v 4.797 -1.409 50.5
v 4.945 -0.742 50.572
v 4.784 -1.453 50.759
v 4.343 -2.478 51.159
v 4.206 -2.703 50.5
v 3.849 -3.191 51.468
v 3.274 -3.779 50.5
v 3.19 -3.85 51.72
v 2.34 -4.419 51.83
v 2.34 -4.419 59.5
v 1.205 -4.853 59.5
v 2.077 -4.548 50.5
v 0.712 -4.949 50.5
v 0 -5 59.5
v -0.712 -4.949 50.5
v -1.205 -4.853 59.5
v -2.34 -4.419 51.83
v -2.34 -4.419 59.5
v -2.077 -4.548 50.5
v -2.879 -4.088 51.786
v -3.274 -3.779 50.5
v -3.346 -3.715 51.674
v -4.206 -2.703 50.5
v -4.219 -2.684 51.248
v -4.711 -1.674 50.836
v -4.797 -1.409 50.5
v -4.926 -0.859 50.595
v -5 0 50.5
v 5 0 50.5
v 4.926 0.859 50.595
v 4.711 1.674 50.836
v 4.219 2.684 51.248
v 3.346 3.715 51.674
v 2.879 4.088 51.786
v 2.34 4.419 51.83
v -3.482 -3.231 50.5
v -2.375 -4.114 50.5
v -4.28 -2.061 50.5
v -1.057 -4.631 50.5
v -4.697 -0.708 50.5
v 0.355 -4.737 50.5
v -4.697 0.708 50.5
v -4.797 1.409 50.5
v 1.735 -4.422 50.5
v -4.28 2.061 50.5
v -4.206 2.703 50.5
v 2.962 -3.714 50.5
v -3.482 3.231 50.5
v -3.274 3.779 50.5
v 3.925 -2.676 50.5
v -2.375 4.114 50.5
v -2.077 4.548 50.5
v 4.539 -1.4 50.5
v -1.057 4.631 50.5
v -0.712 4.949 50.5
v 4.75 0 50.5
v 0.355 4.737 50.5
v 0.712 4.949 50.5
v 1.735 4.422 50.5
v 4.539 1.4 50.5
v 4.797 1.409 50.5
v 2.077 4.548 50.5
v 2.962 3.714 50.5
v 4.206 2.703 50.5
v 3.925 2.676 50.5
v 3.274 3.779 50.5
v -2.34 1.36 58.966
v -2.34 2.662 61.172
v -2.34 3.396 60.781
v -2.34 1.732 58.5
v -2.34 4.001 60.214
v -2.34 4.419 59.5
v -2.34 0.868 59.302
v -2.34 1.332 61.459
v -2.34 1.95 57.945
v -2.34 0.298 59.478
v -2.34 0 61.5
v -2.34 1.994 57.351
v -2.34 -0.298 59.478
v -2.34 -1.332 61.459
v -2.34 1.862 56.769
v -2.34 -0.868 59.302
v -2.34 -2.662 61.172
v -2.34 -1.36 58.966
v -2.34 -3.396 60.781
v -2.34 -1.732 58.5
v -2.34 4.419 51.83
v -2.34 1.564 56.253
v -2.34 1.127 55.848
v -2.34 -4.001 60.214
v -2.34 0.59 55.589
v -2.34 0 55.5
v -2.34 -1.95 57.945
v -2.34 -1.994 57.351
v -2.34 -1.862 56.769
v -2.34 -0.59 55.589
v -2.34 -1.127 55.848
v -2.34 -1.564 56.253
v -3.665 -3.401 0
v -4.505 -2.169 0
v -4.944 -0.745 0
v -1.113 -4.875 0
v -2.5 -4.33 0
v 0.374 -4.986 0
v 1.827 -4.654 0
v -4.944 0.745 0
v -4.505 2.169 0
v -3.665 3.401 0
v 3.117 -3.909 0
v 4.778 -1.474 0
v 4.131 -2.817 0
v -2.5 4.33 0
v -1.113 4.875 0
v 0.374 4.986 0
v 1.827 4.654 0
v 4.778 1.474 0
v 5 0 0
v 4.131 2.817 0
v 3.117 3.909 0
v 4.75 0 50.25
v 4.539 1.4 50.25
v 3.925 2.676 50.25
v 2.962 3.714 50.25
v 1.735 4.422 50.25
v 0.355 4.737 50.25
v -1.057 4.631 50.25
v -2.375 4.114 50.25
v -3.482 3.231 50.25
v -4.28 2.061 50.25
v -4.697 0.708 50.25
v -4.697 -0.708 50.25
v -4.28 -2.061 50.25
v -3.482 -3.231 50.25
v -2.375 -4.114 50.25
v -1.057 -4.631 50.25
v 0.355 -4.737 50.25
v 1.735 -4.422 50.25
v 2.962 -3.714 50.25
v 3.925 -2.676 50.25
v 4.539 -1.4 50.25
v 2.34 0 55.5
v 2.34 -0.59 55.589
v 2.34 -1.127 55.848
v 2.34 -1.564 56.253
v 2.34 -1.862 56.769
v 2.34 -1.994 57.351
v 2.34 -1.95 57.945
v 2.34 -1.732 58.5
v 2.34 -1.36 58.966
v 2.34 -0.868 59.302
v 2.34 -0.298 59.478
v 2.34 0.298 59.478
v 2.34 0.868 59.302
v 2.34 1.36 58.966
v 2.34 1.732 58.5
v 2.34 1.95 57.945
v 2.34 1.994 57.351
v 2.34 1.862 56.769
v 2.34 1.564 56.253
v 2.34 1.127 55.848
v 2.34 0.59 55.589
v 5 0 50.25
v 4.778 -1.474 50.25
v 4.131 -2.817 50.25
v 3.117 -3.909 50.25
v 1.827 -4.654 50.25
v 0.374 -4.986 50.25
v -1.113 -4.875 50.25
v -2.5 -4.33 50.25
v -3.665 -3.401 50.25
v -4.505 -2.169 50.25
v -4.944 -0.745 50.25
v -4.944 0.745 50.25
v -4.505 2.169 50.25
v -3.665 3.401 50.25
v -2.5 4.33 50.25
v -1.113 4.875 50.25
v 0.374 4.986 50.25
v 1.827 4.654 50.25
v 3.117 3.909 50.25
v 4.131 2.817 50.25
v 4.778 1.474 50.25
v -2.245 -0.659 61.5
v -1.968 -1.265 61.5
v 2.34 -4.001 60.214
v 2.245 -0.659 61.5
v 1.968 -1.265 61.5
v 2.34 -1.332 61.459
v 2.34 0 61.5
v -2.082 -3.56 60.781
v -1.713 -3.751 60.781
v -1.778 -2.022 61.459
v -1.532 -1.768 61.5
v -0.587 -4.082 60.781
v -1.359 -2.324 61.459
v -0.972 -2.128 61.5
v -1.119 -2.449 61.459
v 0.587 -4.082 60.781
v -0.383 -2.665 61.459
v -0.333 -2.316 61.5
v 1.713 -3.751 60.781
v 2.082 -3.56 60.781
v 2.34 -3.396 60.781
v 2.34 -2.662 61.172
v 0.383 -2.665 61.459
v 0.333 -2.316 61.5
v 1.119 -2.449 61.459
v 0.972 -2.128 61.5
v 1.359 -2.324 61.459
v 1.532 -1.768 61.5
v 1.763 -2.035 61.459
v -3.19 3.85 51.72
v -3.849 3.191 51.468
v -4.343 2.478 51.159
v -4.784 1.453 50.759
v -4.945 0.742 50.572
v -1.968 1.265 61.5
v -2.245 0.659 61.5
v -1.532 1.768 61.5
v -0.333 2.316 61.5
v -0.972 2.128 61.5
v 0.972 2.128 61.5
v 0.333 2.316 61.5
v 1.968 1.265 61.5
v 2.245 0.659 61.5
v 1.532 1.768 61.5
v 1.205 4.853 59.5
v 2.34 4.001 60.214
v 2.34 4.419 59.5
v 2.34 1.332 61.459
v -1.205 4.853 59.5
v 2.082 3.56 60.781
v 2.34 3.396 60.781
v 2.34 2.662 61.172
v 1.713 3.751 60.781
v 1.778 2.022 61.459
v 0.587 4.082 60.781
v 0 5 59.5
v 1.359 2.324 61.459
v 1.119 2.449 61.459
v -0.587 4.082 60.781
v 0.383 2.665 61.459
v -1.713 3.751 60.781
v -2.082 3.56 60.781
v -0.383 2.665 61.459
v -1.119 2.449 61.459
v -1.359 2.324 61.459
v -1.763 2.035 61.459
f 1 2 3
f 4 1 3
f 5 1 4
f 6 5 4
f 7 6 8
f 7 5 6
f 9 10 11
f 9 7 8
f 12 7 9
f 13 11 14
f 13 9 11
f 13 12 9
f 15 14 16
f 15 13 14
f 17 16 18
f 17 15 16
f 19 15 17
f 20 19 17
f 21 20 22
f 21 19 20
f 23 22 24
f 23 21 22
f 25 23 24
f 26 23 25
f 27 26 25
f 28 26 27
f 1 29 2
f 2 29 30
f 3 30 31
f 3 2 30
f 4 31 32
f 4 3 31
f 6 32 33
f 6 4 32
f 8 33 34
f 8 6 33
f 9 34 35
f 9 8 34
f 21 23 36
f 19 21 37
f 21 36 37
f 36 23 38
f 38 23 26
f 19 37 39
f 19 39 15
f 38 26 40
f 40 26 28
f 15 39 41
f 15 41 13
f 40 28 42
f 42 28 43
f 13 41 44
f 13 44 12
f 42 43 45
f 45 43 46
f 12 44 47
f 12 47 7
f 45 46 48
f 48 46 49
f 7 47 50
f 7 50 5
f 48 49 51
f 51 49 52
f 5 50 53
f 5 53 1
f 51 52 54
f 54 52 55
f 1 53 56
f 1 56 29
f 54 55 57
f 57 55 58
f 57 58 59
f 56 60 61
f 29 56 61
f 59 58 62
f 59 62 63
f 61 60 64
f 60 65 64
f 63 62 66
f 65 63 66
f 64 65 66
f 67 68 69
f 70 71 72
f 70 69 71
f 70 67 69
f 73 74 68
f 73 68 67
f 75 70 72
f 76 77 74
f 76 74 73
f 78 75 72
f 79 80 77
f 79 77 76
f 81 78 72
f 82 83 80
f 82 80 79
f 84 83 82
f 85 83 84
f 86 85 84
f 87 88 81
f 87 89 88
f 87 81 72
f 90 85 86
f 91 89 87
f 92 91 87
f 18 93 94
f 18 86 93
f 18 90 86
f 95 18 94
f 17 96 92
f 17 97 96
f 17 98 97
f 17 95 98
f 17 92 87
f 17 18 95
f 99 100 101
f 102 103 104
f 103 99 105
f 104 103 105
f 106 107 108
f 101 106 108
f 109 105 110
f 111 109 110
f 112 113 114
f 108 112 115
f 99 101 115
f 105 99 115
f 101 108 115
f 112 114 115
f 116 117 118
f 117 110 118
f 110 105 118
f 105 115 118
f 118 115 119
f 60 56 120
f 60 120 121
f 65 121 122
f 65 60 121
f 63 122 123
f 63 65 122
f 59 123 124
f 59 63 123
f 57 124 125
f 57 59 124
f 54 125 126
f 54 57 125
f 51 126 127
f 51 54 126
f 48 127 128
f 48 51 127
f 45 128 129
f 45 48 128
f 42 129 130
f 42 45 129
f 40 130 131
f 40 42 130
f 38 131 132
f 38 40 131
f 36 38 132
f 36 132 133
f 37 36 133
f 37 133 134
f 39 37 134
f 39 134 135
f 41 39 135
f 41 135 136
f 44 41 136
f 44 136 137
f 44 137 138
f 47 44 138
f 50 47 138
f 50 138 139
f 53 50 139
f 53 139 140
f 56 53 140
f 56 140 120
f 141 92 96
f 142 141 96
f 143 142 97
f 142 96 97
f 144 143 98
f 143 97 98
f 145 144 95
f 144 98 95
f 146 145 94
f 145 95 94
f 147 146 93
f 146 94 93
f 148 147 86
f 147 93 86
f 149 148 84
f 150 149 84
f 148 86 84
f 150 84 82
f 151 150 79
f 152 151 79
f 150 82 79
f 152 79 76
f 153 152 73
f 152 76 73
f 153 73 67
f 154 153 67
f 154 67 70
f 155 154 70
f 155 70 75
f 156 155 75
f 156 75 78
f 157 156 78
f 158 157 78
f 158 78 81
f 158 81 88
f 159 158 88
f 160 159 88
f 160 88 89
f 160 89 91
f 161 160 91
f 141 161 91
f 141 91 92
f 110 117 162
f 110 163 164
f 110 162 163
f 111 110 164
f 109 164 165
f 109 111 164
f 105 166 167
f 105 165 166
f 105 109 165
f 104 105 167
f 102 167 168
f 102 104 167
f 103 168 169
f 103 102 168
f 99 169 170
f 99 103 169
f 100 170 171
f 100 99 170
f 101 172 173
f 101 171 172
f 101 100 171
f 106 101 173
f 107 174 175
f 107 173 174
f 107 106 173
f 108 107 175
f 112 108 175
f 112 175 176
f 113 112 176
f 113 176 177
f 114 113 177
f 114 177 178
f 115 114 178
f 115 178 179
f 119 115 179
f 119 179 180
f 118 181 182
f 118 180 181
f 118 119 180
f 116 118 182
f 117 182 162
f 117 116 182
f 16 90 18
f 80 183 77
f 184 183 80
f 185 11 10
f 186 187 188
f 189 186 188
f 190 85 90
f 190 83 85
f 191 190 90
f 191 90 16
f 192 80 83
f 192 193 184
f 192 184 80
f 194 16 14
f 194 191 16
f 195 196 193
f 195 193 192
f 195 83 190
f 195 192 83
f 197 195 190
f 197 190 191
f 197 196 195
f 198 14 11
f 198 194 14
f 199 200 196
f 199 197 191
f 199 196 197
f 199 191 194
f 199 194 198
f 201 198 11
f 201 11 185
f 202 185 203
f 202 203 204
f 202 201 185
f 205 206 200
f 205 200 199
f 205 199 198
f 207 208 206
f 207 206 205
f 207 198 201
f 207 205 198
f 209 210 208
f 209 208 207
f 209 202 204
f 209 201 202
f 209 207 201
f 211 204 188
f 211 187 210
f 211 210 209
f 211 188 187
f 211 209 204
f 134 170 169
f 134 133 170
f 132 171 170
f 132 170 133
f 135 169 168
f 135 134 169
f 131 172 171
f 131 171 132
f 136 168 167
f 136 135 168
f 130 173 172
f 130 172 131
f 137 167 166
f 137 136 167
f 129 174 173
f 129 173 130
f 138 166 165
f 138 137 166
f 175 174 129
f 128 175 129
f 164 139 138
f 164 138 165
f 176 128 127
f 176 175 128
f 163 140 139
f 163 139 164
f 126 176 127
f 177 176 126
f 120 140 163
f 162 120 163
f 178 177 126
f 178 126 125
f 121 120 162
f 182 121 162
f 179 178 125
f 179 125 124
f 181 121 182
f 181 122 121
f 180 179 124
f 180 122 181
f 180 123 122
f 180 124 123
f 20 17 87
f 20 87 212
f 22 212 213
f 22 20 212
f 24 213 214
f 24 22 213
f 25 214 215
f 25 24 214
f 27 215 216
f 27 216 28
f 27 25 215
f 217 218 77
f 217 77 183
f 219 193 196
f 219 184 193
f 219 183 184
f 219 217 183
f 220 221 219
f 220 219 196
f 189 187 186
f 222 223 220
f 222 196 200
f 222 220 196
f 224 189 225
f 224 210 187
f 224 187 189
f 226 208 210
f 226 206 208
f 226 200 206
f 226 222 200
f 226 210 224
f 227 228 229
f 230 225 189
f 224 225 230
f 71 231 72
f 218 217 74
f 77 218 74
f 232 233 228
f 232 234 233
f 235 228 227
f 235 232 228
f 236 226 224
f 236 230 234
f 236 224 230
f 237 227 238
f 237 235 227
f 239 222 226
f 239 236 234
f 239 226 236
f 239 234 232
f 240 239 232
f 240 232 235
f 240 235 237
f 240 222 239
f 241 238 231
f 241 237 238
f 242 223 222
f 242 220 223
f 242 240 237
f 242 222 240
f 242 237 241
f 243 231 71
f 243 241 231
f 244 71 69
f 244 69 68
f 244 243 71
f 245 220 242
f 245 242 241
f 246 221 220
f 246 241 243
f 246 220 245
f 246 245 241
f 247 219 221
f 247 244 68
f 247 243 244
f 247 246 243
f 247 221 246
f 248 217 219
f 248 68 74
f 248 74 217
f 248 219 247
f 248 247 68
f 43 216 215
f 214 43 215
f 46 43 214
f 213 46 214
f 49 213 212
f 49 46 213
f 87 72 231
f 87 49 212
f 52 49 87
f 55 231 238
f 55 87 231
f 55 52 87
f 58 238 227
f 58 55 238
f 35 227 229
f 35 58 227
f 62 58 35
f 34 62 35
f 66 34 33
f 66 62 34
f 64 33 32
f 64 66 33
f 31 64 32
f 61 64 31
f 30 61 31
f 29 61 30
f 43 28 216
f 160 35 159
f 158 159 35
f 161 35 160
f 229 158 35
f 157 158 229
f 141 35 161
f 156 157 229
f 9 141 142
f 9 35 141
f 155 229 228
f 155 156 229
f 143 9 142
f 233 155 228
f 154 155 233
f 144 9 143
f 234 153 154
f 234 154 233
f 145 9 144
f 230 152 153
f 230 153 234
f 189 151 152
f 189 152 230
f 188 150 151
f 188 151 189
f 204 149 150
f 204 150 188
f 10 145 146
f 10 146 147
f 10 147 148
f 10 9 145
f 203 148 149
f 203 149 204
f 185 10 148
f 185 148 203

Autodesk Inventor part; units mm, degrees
ref_plane "YZ Plane" through (0, 0, 0) normal (1, 0, 0) x (0, 1, 0)
ref_plane "XZ Plane" through (0, 0, 0) normal (0, 1, 0) x (-1, 0, 0)
sketch "Rod" plane through (0, 0, 0) normal (0, 0, 1) x (1, 0, 0)
  circle A0 centre (0, 0) radius 5
  dimension "d0" = 10
extrude "RodFeature" add sketch "Rod" along normal blind 50.5
ref_plane "RodEndPlane" through (0, 0, 50.5) normal (0, 0, 1) x (1, 0, 0)
sketch "RodEnd" plane through (0, 0, 50.5) normal (0, 0, 1) x (1, 0, 0)
  circle A0 centre (0, 0) radius 5 projected
extrude "RodEndFeature" add sketch "RodEnd" along normal blind 11
sketch "RodEndTip" plane through (0, 0, 0) normal (1, 0, 0) x (0, 1, 0)
  line L0 (5, 0) -> (5, 61.5)
  line L1 (5, 61.5) -> (-5, 61.5)
  line L2 (-5, 0) -> (-5, 61.5)
  arc A0 (5, 59.5) -> (2, 61.5) centre (2.169876, 58.504813) ccw
  line L3 (0, -12.300193) -> (0, 73.801157) construction
  arc A1 (-2, 61.5) -> (-5, 59.5) centre (-2.169876, 58.504813) ccw
  point P0 (0, 0)
  point P1 (-5, 59.5)
  point P2 (-2.339751, 61.5)
  point P3 (2.339751, 61.5)
  dimension "d6" = 3
  dimension "d7" = 2
  dimension "d8" = 3
sketch "RodEndTip outline for RodEndTipFeature" plane through (0, 0, 0) normal (1, 0, 0) x (0, 1, 0)
  arc A0 (-5, 59.5) -> (-2.339751, 61.5) centre (-2.169876, 58.504813) cw
  line L0 (-5, 61.5) -> (-5, 59.5)
  line L1 (-2.339751, 61.5) -> (-5, 61.5)
  arc A1 (2.339751, 61.5) -> (5, 59.5) centre (2.169876, 58.504813) cw
  line L2 (5, 61.5) -> (2.339751, 61.5)
  line L3 (5, 59.5) -> (5, 61.5)
revolve "RodEndTipFeature" cut sketch "RodEndTip outline for RodEndTipFeature" angle 360 about axis through (0, 0, -10) along (0, 0, 1)
sketch "RodEndProfile" plane through (0, 0, 0) normal (0, 1, 0) x (-1, 0, 0)
  line L0 (2.339751, 61.5) -> (-2.339751, 61.5)
  line L1 (-5, 59.5) -> (5, 59.5)
  line L2 (-5, 59.5) -> (5, 59.5)
  line L3 (5, 0) -> (-5, 0)
  line L4 (-2.339751, 61.5) -> (2.339751, 61.5)
  line L5 (2.339751, 61.5) -> (2.339751, 50.5)
  line L6 (2.339751, 50.5) -> (-2.339751, 50.5)
  line L7 (-2.339751, 50.5) -> (-2.339751, 61.5)
  line L8 (-7.423886, 50.5) -> (7.423886, 50.5)
  arc A0 (-2.339751, 61.5) -> (-5, 59.5) centre (-2.169876, 58.504813) ccw
  arc A1 (5, 59.5) -> (2.339751, 61.5) centre (2.169876, 58.504813) ccw
  line L9 (5, 0) -> (5, 59.5)
  line L10 (-5, 0) -> (-5, 59.5)
  arc A2 (5, 50.5) -> (2.339751, 51.83) centre (2.339751, 48.504503) ccw
  line L11 (0, -12.280546) -> (0, 73.683275)
  arc A3 (-2.339751, 51.83) -> (-5, 50.5) centre (-2.339751, 48.504503) ccw
  line L12 (2.339751, 51.83) -> (-2.339751, 51.83) construction
  point P0 (0, 0)
  point P1 (5, 50)
  point P2 (-2.339751, 51.83)
  dimension "d10" = 4.6795
  dimension "d13" = 1.33
extrude "RodEndProfileFeature" cut sketch "RodEndProfile" along normal through all both and the other way through all contours A1 L1 L5 | L1 L9 A2 L5 | L7 L1 A0 | L7 A3 L10 L1
sketch "RodEndEtch" plane through (0, 0, 50.5) normal (0, 0, 1) x (1, 0, 0)
  circle A0 centre (0, 0) radius 5 projected
  circle A1 centre (0, 0) radius 4.75
  dimension "d14" = 0.25
extrude "RodEndEtchFeature" cut sketch "RodEndEtch" against normal blind 0.25
sketch "RodEndHole" plane through (2.339751, -4.418774, 51.83) normal (1, 0, 0) x (0, 0, -1)
  line L0 (64.130968, 4.418774) -> (-21.975807, 4.418774) construction
  line L1 (-3.67, 6.418774) -> (-7.67, 6.418774)
  line L2 (-7.67, 6.418774) -> (-7.67, 2.418774)
  line L3 (-7.67, 2.418774) -> (-3.67, 2.418774)
  line L4 (-3.67, 2.418774) -> (-3.67, 6.418774)
  line L5 (-3.67, 6.418774) -> (-7.67, 2.418774) construction
  line L6 (-7.67, 6.418774) -> (-3.67, 2.418774) construction
  line L7 (-9.67, 4.418774) -> (-9.67, 2.079023)
  point P0 (51.83, 4.418774)
  point P1 (-5.67, 4.418774)
  dimension "d17" = 2
  dimension "d18" = 4
hole "RodEndHoleFeature" at (2.339751, 0, 57.5) direction (-1, 0, 0) diameter 4 end through all
properties part number "1610-50H-2KG-12V-B07-Shaft"
